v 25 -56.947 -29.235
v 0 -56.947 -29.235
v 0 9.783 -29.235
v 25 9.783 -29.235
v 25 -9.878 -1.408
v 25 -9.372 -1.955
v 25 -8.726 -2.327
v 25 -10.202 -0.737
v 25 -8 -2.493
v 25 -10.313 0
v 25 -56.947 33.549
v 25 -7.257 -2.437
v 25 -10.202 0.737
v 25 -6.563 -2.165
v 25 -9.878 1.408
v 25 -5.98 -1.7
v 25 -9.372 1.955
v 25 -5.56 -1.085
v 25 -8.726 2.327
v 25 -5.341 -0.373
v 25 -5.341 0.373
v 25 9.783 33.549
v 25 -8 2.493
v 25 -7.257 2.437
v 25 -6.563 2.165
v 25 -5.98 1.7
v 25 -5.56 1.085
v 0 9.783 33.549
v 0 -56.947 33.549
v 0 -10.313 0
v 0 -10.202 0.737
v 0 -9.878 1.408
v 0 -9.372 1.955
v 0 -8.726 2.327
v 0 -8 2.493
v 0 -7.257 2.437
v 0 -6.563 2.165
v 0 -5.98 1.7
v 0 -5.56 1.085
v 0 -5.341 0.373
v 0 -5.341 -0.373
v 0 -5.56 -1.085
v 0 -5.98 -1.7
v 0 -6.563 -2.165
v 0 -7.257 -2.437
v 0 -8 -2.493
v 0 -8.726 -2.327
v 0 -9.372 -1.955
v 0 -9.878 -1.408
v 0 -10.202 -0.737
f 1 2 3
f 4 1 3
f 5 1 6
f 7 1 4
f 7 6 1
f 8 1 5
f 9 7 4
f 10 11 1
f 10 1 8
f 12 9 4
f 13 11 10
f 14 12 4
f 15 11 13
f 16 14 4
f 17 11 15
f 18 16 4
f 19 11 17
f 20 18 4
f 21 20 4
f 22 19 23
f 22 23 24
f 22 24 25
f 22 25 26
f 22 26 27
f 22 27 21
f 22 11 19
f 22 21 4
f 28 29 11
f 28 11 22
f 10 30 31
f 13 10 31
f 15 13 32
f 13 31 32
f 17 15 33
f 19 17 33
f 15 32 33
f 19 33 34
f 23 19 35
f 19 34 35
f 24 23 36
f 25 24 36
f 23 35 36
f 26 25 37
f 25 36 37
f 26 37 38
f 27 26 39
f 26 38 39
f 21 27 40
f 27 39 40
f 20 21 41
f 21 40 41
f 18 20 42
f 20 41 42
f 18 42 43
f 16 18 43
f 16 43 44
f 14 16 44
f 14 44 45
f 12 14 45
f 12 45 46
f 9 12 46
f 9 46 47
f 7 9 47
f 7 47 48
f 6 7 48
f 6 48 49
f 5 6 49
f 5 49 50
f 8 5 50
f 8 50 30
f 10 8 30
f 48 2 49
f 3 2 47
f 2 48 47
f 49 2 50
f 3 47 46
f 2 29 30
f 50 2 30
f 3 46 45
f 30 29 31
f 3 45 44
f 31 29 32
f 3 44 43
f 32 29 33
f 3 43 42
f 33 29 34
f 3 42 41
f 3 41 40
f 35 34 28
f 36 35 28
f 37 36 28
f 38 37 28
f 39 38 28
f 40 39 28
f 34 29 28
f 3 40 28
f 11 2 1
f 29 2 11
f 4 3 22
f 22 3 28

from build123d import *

# Parameters (mm, degrees)
F0_W     = 66.73024
F0_H     = 62.78385
F1_DEPTH = 25
F2_R     = 10.820762
F4_DEPTH = 25
F5_D     = 5


with BuildPart() as f1:
    # F0 (on Right) → F1 (new body)
    with BuildSketch(Plane.YZ):
        with Locations((-23.582063, 2.156687)):
            Rectangle(F0_W, F0_H)
    extrude(amount=F1_DEPTH)

    # F2 (on face) → F4 (join)
    with BuildSketch(Plane.YZ.offset(25)):
        with Locations((-27.518781, 9.579325)):
            Circle(F2_R)
    extrude(amount=-F4_DEPTH)

    # F5 (through all)
    with Locations(Plane.YZ.offset(25)):
        with Locations((-7.812866, 0)):
            Hole(F5_D / 2)


solid = f1.part
